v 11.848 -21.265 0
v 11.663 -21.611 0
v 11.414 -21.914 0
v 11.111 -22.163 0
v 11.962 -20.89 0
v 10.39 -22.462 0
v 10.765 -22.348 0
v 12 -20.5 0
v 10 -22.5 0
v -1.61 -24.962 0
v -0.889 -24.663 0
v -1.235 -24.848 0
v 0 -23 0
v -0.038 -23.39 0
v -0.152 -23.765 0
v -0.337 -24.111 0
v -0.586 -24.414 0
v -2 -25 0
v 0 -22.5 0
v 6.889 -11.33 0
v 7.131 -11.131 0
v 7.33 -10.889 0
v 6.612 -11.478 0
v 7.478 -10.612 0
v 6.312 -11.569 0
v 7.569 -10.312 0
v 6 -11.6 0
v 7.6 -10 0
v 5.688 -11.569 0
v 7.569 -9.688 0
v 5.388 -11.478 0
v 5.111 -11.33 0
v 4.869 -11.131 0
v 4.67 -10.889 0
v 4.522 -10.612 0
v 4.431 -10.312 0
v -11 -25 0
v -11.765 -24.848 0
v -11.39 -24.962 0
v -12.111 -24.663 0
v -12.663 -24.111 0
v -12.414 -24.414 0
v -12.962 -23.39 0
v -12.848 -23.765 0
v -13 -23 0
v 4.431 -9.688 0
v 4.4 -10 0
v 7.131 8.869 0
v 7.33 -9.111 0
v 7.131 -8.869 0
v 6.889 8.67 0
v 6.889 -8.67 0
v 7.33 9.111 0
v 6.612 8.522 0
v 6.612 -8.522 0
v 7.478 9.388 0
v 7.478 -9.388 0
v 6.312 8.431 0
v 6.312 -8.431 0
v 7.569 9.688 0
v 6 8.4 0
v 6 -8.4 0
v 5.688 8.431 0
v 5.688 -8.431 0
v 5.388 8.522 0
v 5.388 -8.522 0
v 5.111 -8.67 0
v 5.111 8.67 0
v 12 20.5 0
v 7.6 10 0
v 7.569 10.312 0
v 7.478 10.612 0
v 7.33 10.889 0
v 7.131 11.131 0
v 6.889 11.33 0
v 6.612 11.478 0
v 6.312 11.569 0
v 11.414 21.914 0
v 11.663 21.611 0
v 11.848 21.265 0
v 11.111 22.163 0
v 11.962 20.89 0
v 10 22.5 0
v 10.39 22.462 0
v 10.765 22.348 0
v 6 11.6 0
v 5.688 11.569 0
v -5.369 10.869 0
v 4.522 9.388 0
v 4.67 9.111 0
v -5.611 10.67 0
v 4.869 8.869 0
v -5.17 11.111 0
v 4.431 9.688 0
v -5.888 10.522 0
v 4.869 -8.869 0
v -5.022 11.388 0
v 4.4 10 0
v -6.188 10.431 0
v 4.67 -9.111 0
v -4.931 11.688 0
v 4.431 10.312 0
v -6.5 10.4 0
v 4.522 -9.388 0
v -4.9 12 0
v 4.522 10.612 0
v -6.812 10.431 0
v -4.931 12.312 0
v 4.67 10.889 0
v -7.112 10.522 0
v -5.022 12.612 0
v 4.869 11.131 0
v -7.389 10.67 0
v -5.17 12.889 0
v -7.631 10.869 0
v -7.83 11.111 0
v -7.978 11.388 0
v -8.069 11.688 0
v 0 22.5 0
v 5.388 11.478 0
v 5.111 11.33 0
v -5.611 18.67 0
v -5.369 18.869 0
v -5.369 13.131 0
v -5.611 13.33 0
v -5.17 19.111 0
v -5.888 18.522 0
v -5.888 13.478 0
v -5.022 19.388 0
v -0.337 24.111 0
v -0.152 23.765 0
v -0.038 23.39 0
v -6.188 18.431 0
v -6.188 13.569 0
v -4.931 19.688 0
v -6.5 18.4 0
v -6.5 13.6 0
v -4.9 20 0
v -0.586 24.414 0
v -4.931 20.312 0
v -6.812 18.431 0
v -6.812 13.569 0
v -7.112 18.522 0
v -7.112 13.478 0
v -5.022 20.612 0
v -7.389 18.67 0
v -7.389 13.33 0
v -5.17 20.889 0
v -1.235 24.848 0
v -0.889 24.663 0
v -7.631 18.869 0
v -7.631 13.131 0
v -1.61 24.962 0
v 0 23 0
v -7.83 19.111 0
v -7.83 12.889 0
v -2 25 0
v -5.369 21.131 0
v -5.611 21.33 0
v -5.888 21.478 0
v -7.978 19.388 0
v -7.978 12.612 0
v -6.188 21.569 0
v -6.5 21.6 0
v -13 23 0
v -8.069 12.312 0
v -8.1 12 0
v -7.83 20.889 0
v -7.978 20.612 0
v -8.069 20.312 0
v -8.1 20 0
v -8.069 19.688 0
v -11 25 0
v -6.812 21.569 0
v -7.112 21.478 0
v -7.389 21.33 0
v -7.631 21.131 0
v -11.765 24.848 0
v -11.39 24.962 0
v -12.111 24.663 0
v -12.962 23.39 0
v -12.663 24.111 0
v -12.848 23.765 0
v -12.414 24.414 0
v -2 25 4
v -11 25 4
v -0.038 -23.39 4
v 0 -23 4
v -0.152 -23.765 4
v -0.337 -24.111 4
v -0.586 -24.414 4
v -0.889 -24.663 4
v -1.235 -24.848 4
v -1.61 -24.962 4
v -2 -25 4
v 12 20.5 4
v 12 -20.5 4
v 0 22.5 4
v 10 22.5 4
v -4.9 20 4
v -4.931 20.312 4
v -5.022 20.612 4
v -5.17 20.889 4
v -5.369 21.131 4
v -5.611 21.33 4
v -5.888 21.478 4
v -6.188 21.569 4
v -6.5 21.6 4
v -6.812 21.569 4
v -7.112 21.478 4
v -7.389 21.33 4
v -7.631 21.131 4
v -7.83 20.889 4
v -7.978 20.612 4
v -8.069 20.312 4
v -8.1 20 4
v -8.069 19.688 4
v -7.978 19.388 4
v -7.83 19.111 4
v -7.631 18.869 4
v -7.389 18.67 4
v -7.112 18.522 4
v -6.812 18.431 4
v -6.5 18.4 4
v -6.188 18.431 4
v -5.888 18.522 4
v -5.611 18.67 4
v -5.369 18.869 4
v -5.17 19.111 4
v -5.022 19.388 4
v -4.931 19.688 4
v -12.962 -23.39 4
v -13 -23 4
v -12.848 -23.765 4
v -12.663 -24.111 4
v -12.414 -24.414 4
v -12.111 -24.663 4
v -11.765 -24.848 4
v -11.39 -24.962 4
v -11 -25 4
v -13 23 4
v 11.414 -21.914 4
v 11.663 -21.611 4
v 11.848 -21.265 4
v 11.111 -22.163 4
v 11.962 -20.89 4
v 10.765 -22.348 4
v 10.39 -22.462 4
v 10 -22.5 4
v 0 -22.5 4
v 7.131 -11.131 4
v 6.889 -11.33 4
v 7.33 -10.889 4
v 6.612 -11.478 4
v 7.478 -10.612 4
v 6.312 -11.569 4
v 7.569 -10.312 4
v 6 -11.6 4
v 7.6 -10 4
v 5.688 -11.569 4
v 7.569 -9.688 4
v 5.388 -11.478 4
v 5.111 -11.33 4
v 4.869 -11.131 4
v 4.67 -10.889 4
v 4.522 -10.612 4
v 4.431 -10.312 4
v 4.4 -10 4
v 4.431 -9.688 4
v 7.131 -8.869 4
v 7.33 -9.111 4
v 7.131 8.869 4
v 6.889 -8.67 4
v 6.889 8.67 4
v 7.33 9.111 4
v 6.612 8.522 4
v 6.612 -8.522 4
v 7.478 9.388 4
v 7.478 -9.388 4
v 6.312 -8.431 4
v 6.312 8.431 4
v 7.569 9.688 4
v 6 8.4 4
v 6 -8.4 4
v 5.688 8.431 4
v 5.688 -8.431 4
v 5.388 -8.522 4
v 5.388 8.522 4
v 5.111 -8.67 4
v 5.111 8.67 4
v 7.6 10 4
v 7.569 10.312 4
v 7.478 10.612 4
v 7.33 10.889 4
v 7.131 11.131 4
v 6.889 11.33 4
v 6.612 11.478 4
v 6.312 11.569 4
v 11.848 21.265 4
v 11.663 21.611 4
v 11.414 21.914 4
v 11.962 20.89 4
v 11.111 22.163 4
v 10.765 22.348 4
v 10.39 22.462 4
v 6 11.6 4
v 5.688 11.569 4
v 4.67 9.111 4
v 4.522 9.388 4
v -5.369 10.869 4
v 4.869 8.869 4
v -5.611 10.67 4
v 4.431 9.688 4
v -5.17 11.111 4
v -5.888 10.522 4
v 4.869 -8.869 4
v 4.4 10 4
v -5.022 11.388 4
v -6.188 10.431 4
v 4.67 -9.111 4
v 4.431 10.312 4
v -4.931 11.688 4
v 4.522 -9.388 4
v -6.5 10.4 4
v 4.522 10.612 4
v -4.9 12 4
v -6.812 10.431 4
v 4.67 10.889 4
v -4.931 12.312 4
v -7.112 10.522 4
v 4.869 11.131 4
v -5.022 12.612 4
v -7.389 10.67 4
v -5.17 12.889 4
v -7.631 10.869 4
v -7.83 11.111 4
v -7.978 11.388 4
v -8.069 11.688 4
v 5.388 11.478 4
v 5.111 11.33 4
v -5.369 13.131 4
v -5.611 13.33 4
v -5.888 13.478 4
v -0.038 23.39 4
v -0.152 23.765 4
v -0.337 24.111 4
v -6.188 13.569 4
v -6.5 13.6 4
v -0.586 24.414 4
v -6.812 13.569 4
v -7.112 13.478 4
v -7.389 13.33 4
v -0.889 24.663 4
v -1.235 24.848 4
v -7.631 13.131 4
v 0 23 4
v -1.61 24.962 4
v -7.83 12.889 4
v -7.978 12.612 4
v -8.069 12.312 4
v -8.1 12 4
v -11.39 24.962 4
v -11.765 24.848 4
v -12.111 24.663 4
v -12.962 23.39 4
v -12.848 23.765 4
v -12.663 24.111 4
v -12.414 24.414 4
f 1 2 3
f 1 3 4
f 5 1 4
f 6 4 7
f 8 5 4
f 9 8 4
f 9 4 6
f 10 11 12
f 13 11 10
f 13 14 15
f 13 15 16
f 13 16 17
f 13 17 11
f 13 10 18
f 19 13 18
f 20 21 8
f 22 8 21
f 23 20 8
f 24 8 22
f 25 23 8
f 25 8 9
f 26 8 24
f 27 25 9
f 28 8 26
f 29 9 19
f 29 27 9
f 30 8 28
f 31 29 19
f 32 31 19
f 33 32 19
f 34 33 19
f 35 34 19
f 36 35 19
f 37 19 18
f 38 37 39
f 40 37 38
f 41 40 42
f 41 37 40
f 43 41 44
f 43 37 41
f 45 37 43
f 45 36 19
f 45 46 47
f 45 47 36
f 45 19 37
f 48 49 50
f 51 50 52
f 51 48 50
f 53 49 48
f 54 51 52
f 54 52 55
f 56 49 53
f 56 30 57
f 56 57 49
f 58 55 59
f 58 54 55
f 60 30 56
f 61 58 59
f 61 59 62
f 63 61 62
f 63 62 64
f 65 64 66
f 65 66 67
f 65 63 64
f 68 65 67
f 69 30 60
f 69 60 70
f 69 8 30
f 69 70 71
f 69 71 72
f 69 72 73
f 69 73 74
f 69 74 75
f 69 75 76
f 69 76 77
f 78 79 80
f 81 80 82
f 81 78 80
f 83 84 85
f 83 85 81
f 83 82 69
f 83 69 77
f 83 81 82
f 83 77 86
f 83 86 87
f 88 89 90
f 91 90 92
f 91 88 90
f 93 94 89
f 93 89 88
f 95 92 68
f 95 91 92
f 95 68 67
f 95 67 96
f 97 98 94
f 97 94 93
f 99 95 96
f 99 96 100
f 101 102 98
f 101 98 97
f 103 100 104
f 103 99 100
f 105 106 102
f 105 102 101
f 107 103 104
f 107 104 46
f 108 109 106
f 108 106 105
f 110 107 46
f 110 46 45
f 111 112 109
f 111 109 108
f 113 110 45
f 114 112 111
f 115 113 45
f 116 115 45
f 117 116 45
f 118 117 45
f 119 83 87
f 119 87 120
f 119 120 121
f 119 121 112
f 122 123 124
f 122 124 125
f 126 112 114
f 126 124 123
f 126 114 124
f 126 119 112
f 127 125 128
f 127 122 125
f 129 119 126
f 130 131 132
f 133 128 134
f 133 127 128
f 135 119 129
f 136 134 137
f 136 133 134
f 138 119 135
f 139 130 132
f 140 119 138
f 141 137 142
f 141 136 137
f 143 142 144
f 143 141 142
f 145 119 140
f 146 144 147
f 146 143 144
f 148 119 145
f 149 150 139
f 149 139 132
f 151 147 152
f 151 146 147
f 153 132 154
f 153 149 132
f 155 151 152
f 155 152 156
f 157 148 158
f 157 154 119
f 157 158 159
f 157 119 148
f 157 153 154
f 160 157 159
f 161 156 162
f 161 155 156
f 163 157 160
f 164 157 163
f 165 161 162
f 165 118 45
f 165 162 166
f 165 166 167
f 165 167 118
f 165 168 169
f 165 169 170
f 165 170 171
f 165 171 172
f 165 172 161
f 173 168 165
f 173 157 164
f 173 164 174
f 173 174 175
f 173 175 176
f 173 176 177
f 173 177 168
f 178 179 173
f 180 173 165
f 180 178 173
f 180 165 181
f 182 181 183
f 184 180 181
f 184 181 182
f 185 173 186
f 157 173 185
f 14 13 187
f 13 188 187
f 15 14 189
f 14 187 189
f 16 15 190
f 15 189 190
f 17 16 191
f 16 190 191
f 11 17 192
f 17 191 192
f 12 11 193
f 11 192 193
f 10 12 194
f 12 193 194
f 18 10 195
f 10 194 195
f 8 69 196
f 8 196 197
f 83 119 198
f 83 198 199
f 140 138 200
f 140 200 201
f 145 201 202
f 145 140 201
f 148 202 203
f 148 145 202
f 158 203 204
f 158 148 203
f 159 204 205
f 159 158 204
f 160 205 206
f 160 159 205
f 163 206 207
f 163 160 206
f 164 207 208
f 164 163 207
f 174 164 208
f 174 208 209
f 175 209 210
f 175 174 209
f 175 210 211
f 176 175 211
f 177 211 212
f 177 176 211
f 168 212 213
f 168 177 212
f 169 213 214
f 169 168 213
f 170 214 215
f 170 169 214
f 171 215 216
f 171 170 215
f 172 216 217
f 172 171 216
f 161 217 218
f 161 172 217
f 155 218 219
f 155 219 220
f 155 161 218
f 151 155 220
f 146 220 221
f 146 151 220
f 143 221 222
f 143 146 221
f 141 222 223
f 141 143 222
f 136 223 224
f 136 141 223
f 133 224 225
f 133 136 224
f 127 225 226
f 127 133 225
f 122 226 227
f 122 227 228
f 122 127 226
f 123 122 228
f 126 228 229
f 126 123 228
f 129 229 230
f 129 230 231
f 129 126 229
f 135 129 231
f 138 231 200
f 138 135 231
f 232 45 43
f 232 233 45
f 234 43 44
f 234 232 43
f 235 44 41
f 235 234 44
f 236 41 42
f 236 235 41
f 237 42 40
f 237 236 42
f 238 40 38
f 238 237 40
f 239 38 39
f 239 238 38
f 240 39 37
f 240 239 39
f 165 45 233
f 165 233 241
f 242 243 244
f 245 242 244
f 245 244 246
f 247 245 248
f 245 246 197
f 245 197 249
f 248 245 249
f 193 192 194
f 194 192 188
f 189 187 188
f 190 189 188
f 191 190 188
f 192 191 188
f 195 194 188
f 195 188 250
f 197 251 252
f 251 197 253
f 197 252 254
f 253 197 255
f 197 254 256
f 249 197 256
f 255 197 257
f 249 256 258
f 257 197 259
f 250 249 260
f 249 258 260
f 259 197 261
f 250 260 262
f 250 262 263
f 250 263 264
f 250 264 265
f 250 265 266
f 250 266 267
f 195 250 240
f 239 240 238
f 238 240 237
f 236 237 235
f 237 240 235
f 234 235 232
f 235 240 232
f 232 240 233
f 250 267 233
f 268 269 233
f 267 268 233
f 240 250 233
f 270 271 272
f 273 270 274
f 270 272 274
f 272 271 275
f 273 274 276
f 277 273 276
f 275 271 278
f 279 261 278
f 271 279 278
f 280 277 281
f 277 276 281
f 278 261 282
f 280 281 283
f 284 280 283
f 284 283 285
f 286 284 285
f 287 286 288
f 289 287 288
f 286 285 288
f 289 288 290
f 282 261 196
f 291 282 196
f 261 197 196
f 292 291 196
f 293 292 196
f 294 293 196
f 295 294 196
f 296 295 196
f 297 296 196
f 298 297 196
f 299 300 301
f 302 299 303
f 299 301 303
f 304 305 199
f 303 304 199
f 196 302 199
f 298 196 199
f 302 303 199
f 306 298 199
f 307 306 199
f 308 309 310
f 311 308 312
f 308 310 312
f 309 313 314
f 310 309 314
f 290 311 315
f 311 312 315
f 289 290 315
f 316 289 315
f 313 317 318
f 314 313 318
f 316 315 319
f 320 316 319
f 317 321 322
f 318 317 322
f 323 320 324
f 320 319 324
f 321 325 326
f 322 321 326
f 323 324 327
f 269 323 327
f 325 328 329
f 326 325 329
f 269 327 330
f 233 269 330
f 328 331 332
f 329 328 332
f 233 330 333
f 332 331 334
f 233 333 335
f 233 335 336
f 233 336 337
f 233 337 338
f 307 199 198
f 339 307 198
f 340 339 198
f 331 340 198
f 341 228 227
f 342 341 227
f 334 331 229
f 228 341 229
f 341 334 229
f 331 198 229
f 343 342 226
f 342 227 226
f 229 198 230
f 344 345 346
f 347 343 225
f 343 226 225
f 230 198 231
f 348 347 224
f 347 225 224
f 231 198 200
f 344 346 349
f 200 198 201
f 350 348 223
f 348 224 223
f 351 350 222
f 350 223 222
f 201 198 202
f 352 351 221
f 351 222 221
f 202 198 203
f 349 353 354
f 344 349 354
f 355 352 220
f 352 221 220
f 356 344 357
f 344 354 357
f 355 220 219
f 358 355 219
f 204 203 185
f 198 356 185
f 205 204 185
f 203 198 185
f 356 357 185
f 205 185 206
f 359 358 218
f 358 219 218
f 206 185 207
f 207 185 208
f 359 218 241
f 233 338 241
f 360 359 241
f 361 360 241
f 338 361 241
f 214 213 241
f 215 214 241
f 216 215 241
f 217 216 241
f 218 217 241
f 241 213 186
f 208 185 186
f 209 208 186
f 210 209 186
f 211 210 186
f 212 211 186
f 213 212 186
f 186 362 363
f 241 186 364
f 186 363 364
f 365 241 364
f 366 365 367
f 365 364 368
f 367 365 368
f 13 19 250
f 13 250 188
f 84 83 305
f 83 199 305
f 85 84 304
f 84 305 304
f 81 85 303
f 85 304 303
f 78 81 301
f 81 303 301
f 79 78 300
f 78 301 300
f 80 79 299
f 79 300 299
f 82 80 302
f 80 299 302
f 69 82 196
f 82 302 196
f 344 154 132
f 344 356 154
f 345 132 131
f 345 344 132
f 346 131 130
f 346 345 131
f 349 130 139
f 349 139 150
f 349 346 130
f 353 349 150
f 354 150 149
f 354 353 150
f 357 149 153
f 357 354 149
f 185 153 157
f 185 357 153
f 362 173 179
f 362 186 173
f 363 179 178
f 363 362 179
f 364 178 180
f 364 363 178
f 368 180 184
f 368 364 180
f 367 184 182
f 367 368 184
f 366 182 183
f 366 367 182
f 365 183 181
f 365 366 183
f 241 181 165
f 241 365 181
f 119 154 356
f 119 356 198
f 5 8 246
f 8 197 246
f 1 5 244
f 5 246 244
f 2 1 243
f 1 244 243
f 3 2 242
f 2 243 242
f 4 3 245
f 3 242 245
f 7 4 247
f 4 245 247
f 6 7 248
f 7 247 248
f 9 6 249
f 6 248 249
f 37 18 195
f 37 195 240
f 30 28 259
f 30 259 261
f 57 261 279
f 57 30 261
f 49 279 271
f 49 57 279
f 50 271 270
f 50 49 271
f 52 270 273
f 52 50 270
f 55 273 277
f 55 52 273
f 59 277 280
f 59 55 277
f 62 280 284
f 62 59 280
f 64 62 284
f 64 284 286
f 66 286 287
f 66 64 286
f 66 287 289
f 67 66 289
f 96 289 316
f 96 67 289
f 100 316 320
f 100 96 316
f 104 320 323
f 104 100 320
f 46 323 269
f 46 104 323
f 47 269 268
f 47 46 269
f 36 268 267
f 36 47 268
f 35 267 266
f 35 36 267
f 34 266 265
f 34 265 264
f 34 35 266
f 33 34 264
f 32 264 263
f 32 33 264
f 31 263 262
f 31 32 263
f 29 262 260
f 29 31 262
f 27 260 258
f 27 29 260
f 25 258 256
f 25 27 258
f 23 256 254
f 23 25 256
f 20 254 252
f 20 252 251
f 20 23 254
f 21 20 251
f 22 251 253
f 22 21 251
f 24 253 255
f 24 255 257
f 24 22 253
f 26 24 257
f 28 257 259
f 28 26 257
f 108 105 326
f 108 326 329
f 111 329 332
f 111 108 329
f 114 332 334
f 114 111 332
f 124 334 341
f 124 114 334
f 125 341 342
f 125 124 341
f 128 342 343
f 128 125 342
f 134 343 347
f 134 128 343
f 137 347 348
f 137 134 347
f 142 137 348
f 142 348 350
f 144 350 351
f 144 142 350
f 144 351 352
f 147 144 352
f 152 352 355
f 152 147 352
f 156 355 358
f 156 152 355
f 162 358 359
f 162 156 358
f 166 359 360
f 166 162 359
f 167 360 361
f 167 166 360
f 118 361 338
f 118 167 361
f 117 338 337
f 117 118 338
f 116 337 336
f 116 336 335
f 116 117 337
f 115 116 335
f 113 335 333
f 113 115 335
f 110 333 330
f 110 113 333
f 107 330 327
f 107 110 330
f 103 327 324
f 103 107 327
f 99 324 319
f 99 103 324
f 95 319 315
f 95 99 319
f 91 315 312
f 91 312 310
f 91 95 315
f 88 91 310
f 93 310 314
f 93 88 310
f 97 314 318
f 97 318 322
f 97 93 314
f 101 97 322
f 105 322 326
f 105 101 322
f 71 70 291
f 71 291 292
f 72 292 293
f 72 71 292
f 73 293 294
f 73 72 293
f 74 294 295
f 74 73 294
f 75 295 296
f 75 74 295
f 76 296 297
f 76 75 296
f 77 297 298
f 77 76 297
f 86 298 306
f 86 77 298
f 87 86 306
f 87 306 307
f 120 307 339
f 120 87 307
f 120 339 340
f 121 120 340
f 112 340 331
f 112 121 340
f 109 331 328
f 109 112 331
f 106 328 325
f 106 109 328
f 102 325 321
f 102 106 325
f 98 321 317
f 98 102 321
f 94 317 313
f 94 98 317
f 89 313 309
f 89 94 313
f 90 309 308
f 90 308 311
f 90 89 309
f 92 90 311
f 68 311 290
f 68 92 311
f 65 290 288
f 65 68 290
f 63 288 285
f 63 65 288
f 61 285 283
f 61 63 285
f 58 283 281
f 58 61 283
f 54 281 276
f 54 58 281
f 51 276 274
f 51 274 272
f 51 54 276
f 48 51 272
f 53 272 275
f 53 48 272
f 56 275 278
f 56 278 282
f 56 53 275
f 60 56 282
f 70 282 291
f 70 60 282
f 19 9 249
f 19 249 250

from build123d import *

# Parameters (mm, degrees)
SKETCH_R  = 1.6
PAD_DEPTH = 4
FILLET_R  = 2


with BuildPart() as part:
    # Sketch → Pad (new body)
    with BuildSketch(Plane.XY):
        Polygon((0, 22.5), (12, 22.5), (12, -22.5), (0, -22.5), (0, -25), (-13, -25), (-13, 25), (0, 25), align=None)
        with Locations((6, 10)):
            Circle(SKETCH_R, mode=Mode.SUBTRACT)
        with Locations((6, -10)):
            Circle(SKETCH_R, mode=Mode.SUBTRACT)
        with Locations((-6.5, 20)):
            Circle(SKETCH_R, mode=Mode.SUBTRACT)
        with Locations((-6.5, 12)):
            Circle(SKETCH_R, mode=Mode.SUBTRACT)
    extrude(amount=PAD_DEPTH)

    # Fillet
    fillet_edges = [part.edges().sort_by_distance(p)[0] for p in [
        (12, 22.5, 2),
        (0, 25, 2),
        (-13, 25, 2),
        (-13, -25, 2),
        (0, -25, 2),
        (12, -22.5, 2),
    ]]
    fillet(fillet_edges, radius=FILLET_R)


solid = part.part
